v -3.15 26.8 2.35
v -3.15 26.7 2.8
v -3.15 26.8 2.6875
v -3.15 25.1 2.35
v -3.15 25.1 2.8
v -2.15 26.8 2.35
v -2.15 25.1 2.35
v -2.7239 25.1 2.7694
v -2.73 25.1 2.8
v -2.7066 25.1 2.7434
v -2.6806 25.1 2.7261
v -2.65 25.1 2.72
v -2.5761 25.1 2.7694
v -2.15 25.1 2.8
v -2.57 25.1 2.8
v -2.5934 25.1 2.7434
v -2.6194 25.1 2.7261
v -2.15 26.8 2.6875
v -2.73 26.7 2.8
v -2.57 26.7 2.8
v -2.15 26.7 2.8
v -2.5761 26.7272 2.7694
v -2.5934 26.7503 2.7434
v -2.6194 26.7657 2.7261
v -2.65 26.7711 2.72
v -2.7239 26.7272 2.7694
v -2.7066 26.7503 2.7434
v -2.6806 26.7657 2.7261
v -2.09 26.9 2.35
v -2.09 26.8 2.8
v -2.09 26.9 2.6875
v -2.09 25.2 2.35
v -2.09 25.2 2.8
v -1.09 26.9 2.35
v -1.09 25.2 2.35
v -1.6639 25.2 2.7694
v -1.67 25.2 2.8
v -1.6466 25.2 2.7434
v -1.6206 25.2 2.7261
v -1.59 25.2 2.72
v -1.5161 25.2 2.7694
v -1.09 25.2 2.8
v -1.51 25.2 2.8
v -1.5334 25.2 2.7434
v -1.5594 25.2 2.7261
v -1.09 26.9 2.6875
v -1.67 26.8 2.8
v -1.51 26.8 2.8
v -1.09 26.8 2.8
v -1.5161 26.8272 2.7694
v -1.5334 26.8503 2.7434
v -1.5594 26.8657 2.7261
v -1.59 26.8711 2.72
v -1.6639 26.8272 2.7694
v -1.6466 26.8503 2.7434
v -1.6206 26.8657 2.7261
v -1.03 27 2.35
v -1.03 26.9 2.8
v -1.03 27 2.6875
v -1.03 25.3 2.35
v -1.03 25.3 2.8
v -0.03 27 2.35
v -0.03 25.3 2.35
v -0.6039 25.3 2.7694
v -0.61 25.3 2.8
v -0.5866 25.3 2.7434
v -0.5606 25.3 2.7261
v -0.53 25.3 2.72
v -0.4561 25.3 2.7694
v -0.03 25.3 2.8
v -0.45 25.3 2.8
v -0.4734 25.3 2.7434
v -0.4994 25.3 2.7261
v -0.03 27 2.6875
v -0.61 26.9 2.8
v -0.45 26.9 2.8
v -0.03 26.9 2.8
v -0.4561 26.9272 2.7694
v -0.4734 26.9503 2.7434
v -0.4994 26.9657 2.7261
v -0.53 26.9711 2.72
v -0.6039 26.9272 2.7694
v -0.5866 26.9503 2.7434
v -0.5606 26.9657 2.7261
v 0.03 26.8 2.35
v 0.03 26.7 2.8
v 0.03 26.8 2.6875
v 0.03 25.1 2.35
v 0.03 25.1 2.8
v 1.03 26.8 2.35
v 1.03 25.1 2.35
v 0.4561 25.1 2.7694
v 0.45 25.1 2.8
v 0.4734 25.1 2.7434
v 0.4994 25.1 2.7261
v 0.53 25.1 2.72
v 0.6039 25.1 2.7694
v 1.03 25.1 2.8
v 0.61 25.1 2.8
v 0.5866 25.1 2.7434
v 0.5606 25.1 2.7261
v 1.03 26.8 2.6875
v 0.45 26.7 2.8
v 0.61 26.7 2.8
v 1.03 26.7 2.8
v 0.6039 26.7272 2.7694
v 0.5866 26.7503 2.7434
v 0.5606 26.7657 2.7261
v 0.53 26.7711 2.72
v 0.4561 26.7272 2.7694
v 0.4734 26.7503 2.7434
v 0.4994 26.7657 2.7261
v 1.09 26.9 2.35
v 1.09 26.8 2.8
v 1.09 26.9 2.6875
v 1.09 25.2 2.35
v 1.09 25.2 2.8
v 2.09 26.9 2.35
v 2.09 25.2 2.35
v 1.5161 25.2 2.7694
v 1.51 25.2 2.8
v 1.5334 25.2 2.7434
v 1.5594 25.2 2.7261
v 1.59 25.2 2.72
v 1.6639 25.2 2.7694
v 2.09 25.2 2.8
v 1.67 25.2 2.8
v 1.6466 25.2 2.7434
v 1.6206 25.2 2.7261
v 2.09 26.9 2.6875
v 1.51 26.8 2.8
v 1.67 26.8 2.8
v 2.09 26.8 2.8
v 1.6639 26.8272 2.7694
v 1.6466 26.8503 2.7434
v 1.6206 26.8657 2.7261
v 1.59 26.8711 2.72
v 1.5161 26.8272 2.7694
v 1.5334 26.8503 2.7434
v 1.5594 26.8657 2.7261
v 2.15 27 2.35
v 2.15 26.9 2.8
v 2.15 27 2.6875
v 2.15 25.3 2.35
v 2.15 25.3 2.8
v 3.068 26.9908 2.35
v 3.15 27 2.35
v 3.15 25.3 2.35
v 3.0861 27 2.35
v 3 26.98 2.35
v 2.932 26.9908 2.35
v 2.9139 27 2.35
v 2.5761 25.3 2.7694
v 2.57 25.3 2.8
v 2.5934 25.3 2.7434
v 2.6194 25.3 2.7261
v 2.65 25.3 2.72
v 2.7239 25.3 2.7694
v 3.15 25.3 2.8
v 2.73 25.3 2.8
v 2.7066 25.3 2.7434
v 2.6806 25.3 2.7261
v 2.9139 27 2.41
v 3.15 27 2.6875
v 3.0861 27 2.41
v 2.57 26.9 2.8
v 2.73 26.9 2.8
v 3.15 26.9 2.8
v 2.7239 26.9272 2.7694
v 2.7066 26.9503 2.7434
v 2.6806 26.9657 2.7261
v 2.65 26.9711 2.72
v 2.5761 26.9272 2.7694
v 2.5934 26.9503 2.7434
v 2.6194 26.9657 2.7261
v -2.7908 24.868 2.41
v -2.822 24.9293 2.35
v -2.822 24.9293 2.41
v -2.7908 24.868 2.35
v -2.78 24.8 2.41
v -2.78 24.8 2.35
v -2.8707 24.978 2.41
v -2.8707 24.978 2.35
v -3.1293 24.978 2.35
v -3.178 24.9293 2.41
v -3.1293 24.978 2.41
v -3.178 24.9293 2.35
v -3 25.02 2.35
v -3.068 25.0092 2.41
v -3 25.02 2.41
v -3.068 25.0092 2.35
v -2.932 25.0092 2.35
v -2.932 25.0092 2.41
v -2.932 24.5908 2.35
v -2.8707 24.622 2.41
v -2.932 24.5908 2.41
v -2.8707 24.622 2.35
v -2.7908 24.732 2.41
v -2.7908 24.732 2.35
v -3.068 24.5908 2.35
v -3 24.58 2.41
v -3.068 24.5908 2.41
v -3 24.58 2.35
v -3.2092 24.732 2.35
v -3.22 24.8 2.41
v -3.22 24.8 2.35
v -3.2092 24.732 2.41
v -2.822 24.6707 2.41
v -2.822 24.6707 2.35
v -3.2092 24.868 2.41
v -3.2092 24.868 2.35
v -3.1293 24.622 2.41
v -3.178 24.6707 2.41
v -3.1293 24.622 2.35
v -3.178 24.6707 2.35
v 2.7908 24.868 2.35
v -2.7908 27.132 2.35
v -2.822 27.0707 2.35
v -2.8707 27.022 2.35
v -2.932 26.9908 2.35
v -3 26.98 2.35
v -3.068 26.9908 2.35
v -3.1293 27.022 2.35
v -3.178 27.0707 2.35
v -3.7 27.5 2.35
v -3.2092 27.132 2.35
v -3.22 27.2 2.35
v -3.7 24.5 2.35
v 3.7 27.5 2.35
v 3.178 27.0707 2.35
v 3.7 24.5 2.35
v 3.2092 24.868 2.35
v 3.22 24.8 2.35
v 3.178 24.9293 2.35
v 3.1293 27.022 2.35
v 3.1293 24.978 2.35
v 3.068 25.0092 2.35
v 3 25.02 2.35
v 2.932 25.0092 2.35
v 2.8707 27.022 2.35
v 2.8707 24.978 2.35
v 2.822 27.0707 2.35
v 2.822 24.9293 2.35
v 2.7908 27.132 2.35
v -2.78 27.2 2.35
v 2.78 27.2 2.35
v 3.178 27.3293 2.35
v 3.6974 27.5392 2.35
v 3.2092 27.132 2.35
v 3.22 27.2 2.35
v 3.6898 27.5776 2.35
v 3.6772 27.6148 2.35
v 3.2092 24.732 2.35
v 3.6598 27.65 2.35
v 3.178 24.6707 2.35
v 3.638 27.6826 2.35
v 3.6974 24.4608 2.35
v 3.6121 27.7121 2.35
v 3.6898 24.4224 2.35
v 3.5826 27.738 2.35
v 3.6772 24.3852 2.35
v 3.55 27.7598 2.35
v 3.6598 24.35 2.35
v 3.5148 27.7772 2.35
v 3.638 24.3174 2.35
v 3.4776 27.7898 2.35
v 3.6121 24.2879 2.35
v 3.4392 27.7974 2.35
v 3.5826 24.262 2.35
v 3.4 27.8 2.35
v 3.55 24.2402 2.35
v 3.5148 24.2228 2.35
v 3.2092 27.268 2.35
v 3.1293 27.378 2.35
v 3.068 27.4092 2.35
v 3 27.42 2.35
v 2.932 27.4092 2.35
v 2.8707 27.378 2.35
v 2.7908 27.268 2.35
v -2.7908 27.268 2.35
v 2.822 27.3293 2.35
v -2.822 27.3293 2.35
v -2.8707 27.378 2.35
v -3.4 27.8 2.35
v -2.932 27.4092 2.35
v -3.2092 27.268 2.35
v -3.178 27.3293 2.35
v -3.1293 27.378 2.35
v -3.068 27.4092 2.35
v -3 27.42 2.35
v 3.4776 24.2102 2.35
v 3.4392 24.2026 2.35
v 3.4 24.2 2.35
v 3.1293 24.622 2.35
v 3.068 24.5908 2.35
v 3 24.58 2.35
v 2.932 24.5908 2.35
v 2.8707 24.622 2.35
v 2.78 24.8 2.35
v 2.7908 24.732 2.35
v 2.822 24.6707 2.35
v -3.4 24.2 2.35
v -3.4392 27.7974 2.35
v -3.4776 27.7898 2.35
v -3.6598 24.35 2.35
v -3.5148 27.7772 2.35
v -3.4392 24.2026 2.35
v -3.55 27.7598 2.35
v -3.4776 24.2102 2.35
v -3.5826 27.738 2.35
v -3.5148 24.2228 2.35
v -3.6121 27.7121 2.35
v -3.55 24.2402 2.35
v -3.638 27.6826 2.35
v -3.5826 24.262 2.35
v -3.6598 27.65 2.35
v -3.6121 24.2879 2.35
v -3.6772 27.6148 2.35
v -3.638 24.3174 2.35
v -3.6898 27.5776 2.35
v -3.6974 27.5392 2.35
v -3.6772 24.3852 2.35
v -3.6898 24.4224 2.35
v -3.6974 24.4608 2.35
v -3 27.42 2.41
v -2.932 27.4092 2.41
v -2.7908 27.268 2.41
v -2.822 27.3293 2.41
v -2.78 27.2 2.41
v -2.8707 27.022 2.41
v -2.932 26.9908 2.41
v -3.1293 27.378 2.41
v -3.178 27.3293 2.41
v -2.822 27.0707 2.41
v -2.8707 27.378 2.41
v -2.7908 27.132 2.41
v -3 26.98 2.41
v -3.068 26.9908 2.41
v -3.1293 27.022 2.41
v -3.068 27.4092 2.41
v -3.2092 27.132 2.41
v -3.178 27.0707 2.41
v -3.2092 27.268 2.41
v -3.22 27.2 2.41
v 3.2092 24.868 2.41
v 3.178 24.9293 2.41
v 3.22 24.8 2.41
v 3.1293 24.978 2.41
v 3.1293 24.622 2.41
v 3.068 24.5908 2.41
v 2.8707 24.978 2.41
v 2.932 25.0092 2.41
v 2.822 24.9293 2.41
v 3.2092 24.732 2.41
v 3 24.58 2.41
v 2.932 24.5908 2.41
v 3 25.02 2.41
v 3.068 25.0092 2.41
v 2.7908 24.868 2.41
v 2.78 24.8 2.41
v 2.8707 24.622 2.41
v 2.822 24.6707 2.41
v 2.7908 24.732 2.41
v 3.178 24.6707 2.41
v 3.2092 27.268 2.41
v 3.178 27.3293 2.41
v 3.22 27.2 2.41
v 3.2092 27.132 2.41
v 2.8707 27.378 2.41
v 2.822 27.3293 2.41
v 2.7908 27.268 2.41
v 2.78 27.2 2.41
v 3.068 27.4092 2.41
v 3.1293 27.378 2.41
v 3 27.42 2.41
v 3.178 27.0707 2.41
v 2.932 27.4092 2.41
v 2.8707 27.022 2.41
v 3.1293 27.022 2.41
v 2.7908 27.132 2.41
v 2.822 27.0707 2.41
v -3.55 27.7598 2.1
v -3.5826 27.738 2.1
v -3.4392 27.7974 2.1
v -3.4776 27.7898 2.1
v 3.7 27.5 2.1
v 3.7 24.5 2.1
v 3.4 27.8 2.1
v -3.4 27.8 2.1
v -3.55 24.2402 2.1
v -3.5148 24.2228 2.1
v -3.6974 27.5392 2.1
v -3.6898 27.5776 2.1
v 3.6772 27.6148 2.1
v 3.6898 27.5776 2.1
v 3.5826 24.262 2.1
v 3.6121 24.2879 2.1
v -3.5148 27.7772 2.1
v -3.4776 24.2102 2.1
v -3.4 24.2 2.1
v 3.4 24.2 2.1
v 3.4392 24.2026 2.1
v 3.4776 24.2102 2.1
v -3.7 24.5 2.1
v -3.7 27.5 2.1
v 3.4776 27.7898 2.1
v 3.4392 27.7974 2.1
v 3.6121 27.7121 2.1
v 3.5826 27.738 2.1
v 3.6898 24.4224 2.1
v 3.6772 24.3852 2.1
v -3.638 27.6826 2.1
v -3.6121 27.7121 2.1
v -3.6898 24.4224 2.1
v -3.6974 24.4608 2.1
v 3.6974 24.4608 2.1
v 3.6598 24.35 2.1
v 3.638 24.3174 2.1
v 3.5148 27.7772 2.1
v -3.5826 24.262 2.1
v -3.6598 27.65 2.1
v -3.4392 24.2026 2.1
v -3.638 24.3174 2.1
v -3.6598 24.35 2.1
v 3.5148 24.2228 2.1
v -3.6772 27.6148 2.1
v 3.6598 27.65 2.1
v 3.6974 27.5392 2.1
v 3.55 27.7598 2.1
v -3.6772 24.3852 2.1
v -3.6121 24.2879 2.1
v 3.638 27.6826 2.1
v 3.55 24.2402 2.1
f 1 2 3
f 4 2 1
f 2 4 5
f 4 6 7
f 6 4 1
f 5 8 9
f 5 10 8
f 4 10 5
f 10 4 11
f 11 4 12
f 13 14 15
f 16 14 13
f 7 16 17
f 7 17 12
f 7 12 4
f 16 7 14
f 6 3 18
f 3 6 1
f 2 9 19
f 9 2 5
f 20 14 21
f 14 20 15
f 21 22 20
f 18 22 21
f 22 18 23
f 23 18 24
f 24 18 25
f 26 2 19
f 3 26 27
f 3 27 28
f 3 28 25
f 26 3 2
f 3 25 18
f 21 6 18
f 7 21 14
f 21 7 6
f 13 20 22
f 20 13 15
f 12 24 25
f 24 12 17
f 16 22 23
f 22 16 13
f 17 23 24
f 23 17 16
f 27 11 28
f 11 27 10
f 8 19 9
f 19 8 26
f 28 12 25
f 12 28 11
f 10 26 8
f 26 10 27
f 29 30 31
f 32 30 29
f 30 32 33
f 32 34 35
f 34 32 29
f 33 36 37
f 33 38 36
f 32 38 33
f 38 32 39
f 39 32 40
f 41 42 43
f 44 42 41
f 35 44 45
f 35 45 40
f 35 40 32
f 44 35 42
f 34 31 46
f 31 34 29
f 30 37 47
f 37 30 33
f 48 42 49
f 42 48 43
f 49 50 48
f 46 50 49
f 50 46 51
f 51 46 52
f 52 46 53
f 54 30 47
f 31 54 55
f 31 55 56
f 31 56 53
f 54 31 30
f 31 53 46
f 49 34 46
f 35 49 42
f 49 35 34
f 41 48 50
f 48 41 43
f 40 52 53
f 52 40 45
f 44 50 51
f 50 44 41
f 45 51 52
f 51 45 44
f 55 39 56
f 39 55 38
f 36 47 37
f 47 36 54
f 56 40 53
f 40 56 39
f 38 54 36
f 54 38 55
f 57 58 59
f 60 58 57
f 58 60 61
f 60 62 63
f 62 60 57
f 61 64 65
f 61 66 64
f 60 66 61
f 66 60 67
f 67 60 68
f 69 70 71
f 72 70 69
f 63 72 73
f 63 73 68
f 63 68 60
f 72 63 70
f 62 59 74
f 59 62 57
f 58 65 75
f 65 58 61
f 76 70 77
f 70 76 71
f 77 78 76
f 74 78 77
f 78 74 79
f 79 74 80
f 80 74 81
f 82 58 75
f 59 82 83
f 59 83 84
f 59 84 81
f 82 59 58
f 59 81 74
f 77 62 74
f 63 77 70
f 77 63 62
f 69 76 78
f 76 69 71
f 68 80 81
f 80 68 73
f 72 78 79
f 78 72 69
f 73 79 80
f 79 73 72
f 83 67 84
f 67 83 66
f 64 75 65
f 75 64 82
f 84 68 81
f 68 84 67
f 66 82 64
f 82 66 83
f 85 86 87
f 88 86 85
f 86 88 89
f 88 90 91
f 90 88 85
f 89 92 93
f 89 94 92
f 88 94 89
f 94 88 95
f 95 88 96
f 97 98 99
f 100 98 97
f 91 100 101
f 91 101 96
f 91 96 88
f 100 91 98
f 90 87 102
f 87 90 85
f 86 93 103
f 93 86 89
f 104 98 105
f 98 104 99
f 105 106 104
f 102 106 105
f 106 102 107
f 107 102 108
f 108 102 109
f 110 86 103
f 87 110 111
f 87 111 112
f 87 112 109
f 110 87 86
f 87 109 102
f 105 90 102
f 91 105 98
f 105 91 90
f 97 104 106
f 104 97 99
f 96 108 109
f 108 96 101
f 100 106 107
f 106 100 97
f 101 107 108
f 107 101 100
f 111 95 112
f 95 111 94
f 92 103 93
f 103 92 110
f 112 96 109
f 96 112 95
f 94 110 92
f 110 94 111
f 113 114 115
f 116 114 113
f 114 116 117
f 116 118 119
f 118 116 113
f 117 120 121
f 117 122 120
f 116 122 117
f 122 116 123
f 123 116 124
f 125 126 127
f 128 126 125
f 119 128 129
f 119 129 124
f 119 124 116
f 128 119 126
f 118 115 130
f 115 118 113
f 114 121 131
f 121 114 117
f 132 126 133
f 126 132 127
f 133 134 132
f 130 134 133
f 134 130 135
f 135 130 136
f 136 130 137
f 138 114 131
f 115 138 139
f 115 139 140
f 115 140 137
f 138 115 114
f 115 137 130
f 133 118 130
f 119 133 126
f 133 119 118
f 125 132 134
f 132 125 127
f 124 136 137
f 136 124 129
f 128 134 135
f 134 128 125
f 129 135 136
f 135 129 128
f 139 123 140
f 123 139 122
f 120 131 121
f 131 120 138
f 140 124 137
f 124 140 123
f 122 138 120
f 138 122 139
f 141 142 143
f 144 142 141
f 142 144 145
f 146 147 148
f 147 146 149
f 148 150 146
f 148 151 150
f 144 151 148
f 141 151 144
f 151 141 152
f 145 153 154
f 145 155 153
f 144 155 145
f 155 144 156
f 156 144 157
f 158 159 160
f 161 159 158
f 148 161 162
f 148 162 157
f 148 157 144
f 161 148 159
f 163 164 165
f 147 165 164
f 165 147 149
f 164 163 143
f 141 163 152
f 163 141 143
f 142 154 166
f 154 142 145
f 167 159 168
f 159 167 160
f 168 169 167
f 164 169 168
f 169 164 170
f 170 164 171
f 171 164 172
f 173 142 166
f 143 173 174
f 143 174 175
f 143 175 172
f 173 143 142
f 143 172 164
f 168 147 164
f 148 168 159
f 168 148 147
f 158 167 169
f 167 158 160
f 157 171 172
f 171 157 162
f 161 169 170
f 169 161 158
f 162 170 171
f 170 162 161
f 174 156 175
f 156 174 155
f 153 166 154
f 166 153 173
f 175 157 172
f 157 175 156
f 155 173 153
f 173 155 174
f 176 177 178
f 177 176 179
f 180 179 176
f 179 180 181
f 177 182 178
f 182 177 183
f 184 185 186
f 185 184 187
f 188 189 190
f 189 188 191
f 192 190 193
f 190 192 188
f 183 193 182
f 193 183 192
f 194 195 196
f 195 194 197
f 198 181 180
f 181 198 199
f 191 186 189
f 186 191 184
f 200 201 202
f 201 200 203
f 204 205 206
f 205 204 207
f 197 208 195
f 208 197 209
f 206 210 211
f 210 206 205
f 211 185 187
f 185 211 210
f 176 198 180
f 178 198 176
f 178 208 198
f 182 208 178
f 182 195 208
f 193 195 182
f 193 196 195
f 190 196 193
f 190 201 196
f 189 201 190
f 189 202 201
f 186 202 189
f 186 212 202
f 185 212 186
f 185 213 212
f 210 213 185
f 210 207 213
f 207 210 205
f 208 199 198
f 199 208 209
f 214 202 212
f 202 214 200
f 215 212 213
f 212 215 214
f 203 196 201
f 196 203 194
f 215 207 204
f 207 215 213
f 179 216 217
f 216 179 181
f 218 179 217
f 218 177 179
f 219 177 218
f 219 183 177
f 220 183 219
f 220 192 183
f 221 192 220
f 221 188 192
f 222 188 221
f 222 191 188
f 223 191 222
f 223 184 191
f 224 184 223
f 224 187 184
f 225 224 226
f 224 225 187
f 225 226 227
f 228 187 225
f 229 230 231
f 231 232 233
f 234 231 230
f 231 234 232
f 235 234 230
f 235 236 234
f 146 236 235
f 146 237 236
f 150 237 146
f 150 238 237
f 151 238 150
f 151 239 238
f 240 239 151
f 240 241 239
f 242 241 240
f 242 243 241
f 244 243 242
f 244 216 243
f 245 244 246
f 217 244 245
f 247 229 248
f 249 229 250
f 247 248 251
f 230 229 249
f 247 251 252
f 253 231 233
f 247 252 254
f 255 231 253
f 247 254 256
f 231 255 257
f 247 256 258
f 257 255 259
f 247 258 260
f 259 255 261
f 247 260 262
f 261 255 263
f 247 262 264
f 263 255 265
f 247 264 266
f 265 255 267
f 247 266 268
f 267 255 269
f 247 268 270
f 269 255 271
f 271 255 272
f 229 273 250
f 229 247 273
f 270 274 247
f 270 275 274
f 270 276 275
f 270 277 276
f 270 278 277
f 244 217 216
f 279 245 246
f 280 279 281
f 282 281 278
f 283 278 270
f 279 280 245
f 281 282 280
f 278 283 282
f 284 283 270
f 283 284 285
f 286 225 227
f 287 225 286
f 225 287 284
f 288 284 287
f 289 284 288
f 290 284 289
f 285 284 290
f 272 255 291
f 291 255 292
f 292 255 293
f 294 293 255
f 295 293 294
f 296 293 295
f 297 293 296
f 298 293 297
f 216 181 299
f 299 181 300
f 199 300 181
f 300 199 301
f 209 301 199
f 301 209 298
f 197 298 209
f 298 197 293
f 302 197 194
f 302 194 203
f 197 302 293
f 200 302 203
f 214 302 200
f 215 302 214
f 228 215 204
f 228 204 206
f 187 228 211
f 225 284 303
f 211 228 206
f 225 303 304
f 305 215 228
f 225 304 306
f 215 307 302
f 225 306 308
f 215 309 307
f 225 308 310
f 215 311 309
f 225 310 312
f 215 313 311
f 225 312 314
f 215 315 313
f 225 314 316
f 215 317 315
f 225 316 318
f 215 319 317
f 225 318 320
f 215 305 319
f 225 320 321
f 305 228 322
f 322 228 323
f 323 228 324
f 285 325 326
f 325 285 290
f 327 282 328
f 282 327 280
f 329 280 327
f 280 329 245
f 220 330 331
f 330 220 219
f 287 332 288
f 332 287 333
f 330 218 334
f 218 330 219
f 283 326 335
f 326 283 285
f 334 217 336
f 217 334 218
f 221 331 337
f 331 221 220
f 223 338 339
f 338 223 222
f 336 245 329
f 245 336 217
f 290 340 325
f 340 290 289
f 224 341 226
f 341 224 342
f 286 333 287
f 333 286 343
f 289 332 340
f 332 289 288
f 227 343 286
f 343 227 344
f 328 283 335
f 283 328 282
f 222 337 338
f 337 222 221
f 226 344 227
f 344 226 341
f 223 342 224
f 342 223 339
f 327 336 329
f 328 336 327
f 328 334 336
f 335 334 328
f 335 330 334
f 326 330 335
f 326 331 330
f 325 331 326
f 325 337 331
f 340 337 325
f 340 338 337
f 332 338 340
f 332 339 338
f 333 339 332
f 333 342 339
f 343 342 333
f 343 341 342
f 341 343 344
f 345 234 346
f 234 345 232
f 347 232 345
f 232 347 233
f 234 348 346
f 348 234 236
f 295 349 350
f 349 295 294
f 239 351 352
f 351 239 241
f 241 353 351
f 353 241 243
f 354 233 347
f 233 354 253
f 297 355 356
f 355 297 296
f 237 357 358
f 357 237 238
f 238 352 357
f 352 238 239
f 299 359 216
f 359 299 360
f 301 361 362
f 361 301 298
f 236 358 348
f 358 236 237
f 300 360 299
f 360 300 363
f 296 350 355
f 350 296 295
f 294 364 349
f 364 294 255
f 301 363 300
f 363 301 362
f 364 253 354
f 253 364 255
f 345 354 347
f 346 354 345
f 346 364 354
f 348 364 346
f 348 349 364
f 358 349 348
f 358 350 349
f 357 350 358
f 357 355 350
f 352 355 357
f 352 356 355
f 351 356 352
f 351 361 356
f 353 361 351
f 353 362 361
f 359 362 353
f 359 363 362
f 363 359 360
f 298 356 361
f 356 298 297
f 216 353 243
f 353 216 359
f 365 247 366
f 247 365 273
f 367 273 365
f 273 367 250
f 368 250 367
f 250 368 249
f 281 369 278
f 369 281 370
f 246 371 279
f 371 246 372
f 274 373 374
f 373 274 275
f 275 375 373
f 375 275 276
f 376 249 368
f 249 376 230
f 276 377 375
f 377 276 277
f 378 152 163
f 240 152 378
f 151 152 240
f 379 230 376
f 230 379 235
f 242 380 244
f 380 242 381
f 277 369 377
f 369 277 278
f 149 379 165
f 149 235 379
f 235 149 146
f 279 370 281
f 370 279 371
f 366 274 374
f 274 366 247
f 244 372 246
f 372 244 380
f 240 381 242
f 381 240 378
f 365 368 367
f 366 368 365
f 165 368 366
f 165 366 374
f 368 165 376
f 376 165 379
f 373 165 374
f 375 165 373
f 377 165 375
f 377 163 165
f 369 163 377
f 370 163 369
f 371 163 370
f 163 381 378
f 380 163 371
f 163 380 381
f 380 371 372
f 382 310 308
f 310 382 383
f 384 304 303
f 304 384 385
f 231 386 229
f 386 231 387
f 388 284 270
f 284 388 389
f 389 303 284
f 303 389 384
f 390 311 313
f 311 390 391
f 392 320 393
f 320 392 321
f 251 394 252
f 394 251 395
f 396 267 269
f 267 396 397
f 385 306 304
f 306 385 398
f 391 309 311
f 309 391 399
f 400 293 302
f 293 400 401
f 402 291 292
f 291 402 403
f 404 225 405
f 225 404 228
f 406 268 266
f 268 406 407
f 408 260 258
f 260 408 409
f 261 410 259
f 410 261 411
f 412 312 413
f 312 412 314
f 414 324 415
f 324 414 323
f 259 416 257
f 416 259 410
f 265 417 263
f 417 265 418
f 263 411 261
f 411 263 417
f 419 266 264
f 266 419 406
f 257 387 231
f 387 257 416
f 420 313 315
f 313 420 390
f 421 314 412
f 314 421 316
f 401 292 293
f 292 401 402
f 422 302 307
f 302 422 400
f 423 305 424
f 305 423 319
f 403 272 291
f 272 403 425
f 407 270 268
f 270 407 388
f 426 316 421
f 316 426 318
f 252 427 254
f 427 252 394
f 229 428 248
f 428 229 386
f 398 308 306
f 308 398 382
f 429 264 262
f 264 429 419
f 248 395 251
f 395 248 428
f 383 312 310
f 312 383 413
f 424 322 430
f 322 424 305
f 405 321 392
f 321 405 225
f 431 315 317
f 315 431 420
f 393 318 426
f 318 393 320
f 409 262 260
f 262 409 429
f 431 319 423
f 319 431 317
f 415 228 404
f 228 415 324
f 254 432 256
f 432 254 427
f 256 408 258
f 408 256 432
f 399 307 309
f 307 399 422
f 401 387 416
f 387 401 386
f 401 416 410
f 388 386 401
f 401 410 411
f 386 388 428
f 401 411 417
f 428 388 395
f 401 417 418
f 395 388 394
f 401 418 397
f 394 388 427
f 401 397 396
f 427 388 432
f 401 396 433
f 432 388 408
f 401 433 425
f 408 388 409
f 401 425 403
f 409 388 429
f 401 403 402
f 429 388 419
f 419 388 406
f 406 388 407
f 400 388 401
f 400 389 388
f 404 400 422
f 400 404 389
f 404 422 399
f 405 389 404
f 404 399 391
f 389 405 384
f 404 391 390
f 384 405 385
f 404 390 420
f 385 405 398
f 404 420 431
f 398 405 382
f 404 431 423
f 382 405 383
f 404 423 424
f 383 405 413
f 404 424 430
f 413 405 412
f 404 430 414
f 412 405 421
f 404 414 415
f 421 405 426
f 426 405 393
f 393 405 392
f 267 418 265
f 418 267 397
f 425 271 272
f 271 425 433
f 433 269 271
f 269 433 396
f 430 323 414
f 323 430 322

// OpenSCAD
// Physical Chrome Hardware Model: Piezo Hardware Variant
// Includes chrome piezo bridge plate with individual saddles and mounting screws.
$fn = 48;

module piezo_saddle(w = 1.0, len = 2.0, h = 0.50) {
    difference() {
        hull() {
            translate([-w/2, -len/2, 0]) cube([w, len - 0.2, h]);
            translate([-w/2, len/2 - 0.2, 0]) cube([w, 0.1, h * 0.75]);
        }
        // String slot
        translate([0, 0, h])
            rotate([-90, 0, 0])
            cylinder(r = 0.08, h = len + 0.2, center = true, $fn = 16);
    }
}

module piezo_bridge() {
    plate_w = 7.4;
    plate_len = 3.8;
    plate_h = 0.25;

    // Bridge base plate at Y=26.0, Z=2.1
    hull() {
        translate([-plate_w/2 + 0.3, 24.5, 2.1]) cylinder(r = 0.3, h = plate_h);
        translate([ plate_w/2 - 0.3, 24.5, 2.1]) cylinder(r = 0.3, h = plate_h);
        translate([-plate_w/2 + 0.3, 27.5, 2.1]) cylinder(r = 0.3, h = plate_h);
        translate([ plate_w/2 - 0.3, 27.5, 2.1]) cylinder(r = 0.3, h = plate_h);
    }

    // 6 Chrome block saddles
    for (i = [0 : 5]) {
        sx = -2.65 + i * 1.06;
        sy_offset = (i == 0 || i == 3) ? 0.0 : (i == 1 || i == 4) ? 0.10 : 0.20;
        translate([sx, 26.0 + sy_offset, 2.1 + plate_h])
            piezo_saddle(w = 1.0, len = 1.8, h = 0.45);
    }

    // 4 Corner mounting screws
    for (cx = [-3.0, 3.0]) {
        for (cy = [24.8, 27.2]) {
            translate([cx, cy, 2.1 + plate_h])
                cylinder(r = 0.22, h = 0.06, $fn = 20);
        }
    }
}

union() {
    piezo_bridge();
}
